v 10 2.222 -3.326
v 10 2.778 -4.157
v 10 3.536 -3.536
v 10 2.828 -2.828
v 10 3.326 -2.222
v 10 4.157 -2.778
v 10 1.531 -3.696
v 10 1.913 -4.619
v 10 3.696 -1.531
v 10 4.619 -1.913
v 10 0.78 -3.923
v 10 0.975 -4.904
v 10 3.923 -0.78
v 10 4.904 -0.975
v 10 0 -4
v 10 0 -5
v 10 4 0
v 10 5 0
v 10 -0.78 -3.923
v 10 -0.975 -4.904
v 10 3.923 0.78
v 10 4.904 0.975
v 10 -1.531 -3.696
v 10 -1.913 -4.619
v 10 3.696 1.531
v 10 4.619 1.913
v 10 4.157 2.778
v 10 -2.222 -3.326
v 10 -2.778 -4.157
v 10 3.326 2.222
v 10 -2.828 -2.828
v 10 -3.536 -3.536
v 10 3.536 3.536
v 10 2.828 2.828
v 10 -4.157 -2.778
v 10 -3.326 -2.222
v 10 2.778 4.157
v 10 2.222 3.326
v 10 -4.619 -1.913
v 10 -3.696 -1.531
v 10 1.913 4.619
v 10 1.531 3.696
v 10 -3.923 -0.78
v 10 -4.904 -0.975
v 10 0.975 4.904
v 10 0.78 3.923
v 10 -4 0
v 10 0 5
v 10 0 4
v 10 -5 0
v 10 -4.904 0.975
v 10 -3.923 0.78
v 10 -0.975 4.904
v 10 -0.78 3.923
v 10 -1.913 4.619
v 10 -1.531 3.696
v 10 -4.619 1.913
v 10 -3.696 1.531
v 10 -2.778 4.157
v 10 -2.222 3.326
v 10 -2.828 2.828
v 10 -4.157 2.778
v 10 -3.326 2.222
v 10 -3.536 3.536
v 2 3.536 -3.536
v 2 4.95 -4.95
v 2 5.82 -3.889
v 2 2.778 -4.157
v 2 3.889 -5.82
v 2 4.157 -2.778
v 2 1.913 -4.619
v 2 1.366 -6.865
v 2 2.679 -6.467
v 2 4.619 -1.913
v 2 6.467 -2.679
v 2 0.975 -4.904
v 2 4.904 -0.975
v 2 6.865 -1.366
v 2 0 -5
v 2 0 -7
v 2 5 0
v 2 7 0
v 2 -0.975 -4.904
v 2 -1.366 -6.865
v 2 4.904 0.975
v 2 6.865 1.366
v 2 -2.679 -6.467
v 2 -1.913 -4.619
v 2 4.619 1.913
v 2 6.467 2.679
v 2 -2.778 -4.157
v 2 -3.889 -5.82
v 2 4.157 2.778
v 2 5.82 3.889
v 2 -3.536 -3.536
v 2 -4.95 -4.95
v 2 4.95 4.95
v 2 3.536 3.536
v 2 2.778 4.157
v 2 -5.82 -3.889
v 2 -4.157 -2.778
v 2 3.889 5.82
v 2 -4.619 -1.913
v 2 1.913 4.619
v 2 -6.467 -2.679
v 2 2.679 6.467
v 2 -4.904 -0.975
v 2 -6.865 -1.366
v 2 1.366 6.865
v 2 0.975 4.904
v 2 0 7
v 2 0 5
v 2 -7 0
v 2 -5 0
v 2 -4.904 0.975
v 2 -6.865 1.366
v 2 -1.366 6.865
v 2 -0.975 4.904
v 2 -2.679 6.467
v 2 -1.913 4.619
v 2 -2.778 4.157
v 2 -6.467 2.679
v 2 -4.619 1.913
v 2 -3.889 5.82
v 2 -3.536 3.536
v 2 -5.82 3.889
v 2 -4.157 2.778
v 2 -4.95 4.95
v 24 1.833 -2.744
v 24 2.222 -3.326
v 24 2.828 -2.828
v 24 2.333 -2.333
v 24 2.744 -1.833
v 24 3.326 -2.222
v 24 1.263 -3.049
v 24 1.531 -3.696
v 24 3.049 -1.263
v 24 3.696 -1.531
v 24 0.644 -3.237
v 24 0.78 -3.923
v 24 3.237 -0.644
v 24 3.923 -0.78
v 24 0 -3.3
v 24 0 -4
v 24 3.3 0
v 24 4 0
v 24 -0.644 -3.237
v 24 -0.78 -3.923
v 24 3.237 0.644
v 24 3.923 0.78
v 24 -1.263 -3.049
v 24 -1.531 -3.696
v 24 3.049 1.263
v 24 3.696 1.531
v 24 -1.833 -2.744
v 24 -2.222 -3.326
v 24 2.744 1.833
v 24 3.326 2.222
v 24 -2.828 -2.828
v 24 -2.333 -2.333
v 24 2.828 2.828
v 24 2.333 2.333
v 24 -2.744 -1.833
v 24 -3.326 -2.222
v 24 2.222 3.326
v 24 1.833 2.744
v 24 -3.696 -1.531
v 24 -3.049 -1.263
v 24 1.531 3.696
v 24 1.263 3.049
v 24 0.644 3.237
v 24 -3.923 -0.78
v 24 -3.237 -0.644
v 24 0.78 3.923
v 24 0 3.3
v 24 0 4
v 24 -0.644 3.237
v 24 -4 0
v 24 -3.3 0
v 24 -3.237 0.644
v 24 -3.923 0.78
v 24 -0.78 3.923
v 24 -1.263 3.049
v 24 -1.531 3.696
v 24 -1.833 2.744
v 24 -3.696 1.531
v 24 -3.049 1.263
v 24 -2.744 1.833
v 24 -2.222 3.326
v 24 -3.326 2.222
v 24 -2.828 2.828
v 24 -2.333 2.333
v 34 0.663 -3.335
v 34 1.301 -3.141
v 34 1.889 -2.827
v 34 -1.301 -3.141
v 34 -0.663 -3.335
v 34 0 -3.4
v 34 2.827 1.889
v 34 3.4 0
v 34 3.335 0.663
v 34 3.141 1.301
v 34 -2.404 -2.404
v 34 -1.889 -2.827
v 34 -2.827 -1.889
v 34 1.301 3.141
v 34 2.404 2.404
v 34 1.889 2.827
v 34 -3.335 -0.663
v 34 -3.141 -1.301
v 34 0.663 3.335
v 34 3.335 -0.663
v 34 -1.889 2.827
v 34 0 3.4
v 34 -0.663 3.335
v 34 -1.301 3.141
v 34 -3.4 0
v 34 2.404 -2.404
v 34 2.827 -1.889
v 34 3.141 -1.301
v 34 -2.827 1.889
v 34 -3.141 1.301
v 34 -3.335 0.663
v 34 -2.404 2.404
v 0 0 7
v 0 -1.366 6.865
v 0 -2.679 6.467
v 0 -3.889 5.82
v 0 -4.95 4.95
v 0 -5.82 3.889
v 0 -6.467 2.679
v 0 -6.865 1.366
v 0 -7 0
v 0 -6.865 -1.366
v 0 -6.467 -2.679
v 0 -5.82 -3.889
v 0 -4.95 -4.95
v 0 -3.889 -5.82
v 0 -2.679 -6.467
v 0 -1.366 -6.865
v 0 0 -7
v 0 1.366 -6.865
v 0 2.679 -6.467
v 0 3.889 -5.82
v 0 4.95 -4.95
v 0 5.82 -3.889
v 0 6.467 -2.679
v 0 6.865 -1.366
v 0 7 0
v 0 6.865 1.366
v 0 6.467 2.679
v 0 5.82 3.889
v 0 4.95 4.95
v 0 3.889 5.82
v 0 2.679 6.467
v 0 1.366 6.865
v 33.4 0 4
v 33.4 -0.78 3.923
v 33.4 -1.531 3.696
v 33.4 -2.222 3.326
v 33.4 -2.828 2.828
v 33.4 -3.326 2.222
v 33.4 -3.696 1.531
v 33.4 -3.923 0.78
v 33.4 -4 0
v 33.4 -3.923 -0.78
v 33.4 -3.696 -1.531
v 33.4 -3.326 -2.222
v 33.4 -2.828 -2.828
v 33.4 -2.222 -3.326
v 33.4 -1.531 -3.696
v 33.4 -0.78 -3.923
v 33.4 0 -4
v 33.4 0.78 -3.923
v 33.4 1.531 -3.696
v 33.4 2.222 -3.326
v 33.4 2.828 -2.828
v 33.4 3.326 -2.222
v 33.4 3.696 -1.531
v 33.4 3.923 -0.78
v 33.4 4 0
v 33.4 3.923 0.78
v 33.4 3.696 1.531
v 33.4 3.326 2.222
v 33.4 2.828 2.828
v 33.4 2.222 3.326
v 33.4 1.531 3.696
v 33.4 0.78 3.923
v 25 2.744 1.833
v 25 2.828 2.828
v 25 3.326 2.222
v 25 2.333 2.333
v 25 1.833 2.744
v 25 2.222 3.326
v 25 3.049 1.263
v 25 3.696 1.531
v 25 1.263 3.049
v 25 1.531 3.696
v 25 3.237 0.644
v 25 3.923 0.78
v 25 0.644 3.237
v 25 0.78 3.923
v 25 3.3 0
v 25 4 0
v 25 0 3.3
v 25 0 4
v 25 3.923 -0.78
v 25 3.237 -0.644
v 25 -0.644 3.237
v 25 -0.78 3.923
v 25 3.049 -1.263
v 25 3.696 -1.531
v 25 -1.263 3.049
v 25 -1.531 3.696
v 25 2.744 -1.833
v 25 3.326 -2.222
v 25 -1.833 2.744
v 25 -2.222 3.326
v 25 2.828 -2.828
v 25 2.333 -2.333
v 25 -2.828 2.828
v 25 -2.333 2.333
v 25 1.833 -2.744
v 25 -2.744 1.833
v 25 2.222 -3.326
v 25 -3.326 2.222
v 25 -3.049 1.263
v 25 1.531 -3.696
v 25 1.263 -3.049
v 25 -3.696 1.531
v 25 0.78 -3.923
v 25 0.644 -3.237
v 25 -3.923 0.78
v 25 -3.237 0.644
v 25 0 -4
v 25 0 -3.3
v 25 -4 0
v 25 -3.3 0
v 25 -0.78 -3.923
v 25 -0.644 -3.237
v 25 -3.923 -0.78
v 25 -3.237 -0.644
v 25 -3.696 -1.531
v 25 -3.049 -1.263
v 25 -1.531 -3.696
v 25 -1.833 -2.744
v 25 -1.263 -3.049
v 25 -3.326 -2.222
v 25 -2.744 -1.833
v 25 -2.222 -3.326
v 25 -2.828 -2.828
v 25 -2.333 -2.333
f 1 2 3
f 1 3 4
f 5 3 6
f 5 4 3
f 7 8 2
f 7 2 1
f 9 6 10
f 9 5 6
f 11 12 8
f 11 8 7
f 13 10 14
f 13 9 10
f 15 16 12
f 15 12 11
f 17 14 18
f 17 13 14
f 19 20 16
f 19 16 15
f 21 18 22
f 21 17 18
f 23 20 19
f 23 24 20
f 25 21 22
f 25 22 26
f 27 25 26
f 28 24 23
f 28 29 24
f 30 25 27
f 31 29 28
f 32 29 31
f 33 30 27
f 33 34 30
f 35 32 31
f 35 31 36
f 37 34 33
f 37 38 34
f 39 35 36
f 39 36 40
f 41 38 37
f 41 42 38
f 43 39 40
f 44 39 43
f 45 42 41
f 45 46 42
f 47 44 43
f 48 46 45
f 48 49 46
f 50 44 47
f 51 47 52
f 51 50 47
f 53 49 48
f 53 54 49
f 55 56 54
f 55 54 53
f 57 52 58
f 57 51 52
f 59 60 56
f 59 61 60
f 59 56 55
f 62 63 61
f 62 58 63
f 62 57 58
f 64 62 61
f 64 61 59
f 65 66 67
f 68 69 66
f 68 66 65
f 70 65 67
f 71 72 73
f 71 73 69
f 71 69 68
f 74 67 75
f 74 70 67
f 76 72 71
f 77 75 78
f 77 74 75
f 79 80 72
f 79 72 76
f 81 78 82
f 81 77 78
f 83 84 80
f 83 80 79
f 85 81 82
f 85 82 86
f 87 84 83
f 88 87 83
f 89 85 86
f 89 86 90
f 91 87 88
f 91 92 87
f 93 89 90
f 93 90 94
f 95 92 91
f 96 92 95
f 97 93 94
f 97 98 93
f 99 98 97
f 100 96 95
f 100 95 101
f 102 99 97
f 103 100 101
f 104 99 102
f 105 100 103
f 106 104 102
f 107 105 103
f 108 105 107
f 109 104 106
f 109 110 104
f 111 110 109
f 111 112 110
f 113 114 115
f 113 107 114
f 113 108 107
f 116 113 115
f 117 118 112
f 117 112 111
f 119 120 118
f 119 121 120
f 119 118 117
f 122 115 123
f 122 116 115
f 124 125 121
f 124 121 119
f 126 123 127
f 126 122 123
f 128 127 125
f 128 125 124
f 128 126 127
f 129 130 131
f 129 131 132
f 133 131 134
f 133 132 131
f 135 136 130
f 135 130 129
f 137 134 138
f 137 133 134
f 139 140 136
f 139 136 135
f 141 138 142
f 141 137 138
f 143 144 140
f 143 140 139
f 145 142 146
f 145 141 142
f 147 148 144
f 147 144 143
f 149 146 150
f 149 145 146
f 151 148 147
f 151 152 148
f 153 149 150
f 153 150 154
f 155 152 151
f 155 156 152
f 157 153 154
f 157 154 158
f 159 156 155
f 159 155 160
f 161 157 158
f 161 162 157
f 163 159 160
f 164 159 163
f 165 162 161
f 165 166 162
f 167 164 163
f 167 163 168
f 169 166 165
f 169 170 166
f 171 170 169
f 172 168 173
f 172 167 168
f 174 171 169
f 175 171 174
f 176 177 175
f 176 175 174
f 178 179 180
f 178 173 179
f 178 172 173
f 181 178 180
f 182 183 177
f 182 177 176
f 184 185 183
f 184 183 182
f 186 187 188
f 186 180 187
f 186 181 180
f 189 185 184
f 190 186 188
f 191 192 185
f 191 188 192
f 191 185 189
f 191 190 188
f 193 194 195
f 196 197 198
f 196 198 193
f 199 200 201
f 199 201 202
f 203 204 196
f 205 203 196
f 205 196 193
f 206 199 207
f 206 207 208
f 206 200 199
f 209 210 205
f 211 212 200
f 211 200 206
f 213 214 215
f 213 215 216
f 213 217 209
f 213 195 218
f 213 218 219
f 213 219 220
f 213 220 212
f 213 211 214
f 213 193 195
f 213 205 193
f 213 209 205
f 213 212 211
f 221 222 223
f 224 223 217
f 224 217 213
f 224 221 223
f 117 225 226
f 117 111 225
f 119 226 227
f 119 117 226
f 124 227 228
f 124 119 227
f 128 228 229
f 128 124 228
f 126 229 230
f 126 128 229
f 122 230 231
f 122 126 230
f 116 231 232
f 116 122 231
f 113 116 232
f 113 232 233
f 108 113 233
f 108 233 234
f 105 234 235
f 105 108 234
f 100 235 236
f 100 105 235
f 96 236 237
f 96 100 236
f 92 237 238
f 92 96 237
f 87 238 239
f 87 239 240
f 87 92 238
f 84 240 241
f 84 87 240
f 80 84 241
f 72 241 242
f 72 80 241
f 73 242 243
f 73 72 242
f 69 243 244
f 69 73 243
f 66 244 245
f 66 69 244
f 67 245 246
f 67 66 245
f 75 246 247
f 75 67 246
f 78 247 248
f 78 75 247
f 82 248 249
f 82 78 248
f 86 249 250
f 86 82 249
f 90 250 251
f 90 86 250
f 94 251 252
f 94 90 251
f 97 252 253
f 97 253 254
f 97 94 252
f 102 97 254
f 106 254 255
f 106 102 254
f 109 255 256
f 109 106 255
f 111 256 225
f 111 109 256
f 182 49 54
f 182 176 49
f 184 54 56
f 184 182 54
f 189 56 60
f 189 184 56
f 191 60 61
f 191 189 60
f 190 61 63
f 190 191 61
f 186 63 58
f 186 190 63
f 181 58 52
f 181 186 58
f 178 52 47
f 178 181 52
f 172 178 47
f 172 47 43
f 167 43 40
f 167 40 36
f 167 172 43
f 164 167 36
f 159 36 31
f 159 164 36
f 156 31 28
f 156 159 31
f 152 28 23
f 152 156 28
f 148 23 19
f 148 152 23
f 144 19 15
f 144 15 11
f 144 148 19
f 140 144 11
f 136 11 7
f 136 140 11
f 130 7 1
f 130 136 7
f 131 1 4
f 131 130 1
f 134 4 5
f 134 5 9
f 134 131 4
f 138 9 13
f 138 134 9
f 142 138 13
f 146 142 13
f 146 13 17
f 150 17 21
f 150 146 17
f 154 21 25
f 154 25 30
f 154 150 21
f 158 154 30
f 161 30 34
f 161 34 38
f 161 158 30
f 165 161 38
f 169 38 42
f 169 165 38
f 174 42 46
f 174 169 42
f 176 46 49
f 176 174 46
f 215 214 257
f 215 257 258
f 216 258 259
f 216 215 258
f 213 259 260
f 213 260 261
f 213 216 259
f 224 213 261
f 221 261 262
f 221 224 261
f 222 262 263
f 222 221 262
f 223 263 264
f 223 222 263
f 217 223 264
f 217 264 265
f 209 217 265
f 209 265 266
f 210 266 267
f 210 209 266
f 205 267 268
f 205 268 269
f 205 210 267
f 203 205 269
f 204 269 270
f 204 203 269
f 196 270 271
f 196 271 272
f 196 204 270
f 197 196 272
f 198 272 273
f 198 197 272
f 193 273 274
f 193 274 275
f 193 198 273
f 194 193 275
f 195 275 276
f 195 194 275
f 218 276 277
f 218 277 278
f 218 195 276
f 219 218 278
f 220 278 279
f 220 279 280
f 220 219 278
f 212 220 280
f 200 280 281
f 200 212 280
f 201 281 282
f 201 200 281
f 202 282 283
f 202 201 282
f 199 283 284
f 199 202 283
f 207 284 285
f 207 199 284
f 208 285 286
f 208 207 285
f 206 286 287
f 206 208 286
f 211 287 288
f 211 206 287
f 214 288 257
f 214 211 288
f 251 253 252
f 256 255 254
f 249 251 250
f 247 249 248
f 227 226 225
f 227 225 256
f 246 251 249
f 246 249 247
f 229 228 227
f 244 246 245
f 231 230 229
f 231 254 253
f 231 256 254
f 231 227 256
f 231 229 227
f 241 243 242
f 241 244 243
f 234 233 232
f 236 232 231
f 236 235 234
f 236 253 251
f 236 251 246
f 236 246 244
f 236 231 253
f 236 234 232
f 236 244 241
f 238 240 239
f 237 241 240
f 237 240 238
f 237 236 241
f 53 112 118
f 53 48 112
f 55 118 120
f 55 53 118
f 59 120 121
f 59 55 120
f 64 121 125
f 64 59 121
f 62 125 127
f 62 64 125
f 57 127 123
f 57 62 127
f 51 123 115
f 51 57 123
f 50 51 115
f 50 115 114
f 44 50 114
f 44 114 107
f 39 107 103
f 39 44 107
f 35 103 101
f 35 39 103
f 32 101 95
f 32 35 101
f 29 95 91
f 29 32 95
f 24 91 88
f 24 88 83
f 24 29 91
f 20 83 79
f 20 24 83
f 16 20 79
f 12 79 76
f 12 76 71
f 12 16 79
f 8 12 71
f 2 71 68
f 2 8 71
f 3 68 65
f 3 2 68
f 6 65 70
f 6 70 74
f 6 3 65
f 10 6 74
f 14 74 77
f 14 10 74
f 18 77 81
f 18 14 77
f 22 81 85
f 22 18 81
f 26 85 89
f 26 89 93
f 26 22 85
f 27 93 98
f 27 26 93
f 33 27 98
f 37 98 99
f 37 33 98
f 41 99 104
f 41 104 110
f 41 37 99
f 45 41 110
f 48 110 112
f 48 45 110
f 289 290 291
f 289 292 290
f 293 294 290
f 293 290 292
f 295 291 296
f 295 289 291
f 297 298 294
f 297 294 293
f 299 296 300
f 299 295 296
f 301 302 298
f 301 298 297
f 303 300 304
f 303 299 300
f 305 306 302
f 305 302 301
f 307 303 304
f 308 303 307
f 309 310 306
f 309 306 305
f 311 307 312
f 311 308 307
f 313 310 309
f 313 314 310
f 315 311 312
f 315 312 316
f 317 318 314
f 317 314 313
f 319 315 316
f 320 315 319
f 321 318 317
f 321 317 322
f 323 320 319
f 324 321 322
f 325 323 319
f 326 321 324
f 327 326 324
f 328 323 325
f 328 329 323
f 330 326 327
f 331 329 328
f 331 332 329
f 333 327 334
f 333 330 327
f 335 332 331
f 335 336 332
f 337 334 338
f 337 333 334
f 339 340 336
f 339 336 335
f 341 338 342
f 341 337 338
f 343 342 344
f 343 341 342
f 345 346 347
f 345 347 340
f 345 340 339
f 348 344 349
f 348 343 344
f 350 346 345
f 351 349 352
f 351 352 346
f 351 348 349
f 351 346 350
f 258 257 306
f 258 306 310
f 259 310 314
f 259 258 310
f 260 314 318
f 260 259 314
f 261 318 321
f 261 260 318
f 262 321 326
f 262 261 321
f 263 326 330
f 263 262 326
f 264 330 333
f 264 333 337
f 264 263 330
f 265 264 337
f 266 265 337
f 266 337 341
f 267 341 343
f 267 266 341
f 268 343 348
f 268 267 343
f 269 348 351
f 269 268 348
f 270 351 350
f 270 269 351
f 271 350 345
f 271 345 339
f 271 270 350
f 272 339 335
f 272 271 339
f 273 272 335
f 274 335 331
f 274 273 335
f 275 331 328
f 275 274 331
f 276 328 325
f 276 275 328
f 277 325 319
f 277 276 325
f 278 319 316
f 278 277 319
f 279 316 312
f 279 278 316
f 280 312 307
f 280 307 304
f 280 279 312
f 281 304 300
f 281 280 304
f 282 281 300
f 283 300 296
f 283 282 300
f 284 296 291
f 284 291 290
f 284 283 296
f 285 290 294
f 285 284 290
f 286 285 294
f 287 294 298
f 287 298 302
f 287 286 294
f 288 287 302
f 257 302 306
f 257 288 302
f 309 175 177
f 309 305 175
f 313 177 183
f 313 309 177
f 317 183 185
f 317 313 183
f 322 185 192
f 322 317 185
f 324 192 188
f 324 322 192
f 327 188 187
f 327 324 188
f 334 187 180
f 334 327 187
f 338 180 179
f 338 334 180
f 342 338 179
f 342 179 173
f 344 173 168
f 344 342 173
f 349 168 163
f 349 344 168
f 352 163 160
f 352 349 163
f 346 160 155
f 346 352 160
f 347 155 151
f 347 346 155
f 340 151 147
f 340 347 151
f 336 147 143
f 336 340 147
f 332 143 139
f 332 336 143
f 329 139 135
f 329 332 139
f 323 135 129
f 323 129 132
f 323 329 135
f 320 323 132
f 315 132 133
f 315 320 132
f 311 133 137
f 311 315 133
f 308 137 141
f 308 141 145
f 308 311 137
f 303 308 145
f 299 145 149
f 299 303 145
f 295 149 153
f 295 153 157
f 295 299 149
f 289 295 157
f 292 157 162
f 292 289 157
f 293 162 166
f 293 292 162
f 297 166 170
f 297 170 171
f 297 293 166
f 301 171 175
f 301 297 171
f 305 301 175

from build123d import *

# Parameters (mm, degrees)
CHANFREIN1_SIZE = 0.6


with BuildPart() as part:
    # Esquisse1 → Base-Révolution (revolve)
    with BuildSketch(Plane.XY, mode=Mode.PRIVATE) as base_r_volution_sk:
        Polygon((0, 0), (0, 7), (2, 7), (2, 5), (10, 5), (10, 4), (24, 4), (24, 3.3), (25, 3.3), (25, 4), (34, 4), (34, 0), align=None)
    revolve(base_r_volution_sk.sketch.rotate(Axis((-12.574722565, 0, 0), (1, 0, 0)), 90), axis=Axis((-12.574722565, 0, 0), (1, 0, 0)))

    # Chanfrein1
    chanfrein1_edges = [part.edges().sort_by_distance(p)[0] for p in [
        (34, 0, -4),
    ]]
    chamfer(chanfrein1_edges, length=CHANFREIN1_SIZE)


solid = part.part
